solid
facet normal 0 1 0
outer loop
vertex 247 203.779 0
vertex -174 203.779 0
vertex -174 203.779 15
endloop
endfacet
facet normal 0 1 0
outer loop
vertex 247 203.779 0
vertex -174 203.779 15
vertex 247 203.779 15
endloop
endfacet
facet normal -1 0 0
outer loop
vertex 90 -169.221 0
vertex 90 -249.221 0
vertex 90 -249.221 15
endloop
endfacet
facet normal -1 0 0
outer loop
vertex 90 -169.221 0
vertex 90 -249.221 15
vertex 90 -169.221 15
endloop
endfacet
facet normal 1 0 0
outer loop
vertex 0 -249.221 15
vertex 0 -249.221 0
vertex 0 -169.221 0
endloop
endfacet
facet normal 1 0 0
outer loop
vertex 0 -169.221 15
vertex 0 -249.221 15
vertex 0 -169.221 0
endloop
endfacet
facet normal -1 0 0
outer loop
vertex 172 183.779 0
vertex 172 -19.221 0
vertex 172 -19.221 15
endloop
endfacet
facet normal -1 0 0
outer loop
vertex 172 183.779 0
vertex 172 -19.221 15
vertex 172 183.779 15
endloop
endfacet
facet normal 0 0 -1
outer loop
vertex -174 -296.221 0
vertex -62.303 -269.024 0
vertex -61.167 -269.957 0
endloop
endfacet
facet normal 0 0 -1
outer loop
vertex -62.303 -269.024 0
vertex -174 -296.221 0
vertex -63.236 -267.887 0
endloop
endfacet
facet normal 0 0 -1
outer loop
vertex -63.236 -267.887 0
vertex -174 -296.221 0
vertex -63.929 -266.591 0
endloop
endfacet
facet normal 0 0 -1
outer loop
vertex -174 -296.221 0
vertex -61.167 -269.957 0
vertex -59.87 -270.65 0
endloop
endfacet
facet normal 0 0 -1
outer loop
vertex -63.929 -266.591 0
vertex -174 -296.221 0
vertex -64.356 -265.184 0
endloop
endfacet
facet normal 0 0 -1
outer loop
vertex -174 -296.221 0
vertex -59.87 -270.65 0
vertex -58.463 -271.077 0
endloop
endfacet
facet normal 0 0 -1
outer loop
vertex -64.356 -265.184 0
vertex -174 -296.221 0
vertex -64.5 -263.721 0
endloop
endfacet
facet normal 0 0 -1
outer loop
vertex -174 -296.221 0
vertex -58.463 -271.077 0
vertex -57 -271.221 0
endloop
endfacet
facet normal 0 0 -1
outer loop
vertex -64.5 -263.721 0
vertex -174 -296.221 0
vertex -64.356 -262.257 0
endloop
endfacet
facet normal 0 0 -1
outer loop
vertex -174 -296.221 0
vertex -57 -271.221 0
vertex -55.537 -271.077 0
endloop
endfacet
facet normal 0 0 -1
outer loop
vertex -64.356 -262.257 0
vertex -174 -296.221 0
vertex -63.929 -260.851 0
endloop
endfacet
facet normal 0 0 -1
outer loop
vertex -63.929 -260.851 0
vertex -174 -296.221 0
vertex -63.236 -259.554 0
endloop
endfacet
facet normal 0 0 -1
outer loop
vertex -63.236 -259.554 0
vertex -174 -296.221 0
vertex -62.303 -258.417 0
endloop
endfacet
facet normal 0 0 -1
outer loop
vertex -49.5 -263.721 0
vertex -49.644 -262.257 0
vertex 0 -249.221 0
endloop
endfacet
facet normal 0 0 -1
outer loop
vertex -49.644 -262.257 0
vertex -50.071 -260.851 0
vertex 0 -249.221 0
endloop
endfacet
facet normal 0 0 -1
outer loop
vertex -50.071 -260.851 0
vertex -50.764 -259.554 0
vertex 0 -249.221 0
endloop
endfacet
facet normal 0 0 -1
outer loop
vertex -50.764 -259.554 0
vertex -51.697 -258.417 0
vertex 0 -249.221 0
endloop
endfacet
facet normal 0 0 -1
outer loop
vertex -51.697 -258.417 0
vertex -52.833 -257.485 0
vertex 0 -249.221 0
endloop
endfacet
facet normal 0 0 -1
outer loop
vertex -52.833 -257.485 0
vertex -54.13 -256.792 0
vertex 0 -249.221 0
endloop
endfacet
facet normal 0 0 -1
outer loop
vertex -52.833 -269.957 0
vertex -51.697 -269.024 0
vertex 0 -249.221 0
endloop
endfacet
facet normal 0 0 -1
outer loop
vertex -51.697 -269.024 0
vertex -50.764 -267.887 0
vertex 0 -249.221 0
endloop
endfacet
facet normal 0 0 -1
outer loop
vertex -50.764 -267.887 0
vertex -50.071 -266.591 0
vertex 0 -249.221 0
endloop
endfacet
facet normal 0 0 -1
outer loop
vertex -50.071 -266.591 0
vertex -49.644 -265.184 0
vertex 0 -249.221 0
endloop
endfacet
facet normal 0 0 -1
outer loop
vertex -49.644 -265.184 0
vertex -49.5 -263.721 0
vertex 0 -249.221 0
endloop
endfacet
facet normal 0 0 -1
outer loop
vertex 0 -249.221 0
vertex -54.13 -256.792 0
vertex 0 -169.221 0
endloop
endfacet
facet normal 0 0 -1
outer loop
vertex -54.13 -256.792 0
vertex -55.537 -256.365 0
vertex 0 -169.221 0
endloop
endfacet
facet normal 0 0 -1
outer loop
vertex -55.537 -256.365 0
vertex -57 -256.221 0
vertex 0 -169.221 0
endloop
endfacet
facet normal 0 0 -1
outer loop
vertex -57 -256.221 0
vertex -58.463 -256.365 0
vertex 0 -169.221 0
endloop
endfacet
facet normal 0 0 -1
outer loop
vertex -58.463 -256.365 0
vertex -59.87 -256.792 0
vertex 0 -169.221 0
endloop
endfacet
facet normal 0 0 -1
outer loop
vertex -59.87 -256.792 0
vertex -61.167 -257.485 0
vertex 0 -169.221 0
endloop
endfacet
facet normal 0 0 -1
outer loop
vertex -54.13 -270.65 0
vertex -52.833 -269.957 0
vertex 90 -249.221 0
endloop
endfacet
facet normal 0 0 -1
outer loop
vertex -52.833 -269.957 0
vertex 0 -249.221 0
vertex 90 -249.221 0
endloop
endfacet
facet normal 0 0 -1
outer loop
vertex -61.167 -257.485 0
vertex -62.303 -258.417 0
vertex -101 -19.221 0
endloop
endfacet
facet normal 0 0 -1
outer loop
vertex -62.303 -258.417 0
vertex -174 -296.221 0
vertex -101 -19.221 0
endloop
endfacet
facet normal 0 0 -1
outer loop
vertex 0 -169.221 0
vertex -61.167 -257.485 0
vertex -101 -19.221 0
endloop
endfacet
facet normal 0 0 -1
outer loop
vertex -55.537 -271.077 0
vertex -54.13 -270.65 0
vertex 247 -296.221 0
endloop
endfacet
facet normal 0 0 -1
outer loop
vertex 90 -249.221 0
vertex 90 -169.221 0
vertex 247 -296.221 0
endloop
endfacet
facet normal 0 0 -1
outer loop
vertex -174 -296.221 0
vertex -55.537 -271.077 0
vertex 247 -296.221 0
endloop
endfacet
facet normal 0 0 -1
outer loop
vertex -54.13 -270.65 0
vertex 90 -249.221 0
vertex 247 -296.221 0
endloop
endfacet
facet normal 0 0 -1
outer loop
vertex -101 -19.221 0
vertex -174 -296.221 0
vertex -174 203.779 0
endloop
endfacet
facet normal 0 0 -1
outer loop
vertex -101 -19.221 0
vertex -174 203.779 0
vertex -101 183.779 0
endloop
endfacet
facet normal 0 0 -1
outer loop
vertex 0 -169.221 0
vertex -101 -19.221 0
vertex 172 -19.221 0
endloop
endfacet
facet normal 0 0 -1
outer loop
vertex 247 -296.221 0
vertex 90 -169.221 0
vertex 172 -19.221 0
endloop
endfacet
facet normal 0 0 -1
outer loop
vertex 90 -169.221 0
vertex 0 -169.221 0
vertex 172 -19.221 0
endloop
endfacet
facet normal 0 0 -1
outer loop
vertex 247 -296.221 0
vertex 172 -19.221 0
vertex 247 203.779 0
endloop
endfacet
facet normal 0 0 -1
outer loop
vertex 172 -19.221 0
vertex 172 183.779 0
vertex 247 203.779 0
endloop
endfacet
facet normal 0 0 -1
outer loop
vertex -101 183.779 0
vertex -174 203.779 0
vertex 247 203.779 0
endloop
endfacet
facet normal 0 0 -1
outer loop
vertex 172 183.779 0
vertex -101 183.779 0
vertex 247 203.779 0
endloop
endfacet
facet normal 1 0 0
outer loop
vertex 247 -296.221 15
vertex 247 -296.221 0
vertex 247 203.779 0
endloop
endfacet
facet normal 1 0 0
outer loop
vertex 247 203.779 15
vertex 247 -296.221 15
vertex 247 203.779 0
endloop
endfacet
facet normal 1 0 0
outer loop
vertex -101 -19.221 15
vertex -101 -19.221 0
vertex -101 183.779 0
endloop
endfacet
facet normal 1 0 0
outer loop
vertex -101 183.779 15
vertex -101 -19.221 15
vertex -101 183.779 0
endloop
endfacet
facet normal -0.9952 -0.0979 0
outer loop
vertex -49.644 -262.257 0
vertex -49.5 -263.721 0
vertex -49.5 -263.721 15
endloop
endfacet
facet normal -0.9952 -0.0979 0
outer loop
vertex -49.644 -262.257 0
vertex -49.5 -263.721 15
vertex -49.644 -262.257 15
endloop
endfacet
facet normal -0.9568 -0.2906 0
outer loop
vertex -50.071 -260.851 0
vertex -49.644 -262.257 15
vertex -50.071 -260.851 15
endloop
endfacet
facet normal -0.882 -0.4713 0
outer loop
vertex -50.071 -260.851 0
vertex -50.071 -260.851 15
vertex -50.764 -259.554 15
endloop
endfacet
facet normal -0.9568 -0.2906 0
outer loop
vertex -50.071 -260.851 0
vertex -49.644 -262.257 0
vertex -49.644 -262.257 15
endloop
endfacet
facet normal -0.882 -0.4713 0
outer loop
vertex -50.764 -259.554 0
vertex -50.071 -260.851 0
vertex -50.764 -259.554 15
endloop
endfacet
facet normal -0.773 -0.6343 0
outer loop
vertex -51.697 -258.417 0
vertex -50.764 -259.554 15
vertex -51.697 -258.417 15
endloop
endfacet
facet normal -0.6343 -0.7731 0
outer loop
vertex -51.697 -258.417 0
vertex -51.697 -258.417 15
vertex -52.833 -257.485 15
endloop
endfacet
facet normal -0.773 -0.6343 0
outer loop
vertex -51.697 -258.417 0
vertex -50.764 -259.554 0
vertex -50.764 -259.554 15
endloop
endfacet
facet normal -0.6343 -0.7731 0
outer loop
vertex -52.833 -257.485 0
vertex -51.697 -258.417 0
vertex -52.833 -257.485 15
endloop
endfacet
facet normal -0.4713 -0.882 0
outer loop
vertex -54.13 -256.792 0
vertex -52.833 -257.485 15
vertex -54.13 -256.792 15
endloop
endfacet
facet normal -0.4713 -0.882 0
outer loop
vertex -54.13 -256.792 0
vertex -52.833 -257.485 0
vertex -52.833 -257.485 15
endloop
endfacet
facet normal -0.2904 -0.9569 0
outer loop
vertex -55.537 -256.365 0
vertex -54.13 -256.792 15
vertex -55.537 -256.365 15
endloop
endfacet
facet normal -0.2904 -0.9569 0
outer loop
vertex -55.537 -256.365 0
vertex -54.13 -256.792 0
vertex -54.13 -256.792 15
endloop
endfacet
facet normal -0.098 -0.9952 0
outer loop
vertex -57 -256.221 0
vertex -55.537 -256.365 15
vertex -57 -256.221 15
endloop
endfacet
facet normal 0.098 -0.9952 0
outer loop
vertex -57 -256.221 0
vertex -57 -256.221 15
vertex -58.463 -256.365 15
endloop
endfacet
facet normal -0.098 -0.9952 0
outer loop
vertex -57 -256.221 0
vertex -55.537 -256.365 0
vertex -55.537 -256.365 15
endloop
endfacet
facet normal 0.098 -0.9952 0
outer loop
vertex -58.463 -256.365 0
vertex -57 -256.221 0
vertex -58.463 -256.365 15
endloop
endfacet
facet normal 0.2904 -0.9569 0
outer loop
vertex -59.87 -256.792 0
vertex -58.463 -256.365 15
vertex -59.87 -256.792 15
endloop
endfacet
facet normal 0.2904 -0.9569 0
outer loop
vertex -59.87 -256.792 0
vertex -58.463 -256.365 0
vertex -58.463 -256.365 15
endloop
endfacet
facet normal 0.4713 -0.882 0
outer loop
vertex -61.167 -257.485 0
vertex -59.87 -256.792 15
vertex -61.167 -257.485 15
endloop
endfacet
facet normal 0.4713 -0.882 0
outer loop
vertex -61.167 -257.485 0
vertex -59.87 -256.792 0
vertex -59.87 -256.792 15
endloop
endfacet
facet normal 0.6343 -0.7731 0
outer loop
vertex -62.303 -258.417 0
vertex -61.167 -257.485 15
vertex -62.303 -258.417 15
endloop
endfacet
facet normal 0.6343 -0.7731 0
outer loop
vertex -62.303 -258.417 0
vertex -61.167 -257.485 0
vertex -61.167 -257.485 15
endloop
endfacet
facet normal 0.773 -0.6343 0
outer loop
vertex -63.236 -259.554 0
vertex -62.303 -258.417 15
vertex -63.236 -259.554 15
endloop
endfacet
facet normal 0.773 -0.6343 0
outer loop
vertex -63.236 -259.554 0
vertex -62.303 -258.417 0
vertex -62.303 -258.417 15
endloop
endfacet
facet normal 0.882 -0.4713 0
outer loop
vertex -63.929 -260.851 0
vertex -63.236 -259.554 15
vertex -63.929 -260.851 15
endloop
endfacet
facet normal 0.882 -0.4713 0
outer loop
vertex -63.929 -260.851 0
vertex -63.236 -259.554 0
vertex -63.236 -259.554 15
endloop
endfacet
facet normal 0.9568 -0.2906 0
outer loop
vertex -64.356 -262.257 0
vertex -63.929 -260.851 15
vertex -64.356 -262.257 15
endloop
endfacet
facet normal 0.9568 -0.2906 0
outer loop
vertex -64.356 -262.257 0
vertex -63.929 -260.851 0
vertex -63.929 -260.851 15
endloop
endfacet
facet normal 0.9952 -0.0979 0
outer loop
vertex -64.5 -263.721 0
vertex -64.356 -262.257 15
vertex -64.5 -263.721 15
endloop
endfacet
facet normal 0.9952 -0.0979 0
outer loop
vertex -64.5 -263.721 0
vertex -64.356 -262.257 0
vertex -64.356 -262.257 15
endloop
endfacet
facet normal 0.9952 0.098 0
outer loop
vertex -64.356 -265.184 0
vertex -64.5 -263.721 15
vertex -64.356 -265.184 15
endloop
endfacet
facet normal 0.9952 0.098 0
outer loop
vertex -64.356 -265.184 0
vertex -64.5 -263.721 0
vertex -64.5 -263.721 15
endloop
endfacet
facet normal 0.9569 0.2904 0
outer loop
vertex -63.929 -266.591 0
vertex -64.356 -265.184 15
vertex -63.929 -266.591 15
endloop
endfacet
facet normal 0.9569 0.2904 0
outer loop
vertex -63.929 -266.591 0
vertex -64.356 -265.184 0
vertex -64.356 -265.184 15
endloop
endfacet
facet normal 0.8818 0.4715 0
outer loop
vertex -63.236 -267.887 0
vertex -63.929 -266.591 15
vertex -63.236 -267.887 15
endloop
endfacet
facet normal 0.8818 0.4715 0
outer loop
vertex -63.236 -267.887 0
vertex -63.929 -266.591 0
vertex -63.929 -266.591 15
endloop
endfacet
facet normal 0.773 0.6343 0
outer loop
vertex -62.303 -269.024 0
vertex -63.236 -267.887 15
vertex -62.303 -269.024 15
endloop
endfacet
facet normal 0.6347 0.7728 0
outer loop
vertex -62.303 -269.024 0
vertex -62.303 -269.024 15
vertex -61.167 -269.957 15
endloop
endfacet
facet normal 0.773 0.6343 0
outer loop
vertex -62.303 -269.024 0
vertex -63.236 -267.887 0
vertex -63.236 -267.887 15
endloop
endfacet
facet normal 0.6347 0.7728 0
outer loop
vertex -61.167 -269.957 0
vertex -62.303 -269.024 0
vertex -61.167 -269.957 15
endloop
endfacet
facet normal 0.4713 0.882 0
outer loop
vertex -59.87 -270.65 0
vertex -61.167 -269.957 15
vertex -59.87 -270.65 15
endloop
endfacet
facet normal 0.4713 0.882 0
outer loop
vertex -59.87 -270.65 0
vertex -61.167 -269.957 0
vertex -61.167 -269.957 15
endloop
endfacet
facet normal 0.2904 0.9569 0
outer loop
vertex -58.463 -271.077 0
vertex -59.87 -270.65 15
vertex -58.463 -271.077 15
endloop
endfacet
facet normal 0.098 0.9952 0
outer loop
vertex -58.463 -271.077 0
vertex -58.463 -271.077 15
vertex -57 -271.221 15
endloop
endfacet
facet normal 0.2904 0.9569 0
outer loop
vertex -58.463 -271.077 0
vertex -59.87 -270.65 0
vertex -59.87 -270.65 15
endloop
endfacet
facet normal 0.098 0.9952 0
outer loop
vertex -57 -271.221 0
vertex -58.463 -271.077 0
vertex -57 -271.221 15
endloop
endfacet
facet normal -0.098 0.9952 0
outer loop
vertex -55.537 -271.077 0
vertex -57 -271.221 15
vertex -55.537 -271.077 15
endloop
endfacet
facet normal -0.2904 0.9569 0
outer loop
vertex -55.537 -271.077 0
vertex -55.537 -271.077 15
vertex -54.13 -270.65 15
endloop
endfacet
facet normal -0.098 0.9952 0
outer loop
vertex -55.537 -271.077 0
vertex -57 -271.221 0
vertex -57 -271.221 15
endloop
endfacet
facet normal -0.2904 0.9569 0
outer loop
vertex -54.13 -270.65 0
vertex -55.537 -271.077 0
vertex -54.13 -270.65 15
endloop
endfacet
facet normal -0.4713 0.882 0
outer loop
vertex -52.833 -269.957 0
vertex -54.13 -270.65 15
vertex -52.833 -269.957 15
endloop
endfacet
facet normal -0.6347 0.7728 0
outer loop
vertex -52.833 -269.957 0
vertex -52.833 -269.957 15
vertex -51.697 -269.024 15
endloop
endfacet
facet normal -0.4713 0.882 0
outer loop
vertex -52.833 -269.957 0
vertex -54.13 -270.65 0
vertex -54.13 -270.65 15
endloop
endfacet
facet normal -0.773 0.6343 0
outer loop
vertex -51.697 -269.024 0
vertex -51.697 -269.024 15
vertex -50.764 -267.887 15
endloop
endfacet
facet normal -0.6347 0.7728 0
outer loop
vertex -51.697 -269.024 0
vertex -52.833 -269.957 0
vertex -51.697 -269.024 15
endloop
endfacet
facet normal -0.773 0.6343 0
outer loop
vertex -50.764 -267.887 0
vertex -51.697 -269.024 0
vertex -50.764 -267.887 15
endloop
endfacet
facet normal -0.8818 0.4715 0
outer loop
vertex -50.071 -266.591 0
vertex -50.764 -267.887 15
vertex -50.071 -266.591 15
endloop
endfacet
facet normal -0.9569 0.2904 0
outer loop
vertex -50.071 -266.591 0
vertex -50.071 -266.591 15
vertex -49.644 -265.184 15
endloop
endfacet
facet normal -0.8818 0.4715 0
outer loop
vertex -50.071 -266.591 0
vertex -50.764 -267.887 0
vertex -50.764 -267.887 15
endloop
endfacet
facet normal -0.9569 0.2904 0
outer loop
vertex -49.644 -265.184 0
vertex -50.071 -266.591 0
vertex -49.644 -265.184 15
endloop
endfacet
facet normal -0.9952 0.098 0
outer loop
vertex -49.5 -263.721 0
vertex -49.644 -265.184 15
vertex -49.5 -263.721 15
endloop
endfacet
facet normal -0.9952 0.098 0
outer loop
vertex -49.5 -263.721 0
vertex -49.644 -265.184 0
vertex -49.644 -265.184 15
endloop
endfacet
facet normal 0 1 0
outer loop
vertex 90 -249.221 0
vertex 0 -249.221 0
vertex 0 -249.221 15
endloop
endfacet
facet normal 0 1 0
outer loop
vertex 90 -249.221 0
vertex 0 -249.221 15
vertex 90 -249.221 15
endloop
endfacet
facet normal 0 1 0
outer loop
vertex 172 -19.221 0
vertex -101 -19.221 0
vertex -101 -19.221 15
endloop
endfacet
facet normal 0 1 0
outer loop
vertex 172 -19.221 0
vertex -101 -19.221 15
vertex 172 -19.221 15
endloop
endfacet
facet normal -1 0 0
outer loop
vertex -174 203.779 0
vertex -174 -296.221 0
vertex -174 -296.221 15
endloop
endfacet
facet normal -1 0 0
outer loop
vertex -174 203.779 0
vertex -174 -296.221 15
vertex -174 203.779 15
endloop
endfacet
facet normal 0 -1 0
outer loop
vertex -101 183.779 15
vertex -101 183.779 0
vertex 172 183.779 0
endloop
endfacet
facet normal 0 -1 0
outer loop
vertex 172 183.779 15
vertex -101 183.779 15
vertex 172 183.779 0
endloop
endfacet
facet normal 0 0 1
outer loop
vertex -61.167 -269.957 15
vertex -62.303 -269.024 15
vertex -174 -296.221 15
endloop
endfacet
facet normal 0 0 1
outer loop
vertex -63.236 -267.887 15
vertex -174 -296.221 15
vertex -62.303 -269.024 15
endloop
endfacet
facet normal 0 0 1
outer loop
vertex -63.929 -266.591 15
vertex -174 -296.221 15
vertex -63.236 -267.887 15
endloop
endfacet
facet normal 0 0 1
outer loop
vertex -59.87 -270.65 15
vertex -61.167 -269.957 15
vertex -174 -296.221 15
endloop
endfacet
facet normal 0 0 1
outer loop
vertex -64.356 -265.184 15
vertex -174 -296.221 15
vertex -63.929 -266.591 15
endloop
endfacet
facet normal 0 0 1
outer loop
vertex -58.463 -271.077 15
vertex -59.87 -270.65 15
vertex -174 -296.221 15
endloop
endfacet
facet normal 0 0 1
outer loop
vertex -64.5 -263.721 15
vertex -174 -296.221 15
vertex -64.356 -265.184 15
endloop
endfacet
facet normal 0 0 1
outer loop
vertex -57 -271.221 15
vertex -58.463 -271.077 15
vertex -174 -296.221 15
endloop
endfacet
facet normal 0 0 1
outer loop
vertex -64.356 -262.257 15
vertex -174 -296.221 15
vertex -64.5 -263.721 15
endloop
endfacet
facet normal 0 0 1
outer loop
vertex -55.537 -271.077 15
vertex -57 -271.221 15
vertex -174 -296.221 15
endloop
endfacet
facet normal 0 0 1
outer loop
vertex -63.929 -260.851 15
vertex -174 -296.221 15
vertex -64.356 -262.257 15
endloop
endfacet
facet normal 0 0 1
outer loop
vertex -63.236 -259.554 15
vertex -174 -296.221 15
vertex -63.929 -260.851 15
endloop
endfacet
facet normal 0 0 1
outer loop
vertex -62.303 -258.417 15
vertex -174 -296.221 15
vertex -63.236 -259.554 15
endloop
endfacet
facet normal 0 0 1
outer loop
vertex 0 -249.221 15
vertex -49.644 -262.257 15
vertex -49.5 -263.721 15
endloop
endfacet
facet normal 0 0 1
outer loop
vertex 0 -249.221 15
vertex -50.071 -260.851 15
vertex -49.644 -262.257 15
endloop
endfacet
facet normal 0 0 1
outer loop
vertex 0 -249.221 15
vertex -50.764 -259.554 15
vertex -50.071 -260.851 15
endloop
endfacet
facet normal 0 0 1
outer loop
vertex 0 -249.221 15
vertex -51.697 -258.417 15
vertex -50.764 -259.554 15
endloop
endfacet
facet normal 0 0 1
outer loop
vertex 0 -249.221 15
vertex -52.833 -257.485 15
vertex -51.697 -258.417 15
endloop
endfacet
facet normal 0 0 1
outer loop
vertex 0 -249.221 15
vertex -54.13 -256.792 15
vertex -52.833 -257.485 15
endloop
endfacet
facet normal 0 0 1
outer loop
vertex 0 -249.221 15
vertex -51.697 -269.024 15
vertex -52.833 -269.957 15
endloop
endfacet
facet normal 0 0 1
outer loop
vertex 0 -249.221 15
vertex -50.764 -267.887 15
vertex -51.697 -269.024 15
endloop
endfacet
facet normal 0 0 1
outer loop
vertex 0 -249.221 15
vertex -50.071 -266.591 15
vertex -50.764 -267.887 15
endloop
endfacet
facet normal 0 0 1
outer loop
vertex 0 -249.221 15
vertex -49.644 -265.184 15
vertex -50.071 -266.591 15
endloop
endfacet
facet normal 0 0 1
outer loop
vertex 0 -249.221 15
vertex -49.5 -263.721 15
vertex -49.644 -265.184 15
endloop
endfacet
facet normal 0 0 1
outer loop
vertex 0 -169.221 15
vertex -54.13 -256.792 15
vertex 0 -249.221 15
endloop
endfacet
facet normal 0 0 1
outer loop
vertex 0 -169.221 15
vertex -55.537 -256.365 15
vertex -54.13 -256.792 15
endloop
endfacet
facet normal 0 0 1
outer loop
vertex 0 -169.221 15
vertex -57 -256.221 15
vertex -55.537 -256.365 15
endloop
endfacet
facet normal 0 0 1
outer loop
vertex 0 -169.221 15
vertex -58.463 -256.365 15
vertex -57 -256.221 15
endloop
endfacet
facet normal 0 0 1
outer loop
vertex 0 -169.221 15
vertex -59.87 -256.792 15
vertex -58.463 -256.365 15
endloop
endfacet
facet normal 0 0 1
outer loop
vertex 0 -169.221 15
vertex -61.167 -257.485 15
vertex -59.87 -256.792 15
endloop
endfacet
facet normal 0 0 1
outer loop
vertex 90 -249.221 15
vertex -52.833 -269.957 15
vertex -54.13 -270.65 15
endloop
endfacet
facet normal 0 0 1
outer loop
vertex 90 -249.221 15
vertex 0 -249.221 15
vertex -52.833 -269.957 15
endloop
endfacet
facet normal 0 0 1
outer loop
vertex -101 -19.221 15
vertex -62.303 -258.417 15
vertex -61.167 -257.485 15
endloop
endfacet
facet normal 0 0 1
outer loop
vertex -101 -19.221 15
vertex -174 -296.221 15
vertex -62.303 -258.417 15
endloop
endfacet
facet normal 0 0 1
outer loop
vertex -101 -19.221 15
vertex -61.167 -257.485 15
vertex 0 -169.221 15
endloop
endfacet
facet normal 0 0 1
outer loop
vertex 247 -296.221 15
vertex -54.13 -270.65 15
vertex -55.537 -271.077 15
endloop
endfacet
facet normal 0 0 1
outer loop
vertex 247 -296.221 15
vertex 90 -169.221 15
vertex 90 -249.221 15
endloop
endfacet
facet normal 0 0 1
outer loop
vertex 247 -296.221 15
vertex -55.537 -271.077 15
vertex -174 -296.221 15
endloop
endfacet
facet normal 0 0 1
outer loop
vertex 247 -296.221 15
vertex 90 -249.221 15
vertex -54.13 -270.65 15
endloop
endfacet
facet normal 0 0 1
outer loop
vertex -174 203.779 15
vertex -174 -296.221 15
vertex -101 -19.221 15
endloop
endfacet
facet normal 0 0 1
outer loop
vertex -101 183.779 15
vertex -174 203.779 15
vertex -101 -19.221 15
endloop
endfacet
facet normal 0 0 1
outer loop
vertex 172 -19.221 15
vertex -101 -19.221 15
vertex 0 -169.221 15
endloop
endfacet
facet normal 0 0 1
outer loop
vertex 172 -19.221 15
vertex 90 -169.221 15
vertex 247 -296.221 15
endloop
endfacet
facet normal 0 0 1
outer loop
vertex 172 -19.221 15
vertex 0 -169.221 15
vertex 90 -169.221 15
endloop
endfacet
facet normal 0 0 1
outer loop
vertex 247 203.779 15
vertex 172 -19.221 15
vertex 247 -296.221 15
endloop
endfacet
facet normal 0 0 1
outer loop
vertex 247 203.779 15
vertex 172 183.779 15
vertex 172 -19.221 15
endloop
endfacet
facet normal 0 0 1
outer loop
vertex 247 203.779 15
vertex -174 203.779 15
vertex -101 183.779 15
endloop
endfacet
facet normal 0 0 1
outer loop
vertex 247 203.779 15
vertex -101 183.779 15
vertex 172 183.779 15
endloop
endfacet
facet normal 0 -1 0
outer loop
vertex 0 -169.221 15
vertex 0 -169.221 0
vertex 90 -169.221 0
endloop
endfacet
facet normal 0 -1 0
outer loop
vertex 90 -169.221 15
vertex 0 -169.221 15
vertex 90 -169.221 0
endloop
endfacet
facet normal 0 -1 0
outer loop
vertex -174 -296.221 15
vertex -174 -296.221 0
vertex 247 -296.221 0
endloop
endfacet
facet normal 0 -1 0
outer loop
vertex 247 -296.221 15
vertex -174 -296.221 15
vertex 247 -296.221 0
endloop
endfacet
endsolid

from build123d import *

# Parameters (mm, degrees)
F0_W     = 421
F0_H     = 500
F0_R     = 7.5
F0_W_2   = 90
F0_H_2   = 80
F0_W_3   = 273
F0_H_3   = 203
F1_DEPTH = 15


with BuildPart() as f1:
    # F0 (on Top) → F1 (new body)
    with BuildSketch(Plane.XY):
        with Locations((36.5, -46.220626)):
            Rectangle(F0_W, F0_H)
        with Locations((-57, -263.720626)):
            Circle(F0_R, mode=Mode.SUBTRACT)
        with Locations((45, -209.220626)):
            Rectangle(F0_W_2, F0_H_2, mode=Mode.SUBTRACT)
        with Locations((35.5, 82.279374)):
            Rectangle(F0_W_3, F0_H_3, mode=Mode.SUBTRACT)
    extrude(amount=F1_DEPTH)


solid = f1.part
